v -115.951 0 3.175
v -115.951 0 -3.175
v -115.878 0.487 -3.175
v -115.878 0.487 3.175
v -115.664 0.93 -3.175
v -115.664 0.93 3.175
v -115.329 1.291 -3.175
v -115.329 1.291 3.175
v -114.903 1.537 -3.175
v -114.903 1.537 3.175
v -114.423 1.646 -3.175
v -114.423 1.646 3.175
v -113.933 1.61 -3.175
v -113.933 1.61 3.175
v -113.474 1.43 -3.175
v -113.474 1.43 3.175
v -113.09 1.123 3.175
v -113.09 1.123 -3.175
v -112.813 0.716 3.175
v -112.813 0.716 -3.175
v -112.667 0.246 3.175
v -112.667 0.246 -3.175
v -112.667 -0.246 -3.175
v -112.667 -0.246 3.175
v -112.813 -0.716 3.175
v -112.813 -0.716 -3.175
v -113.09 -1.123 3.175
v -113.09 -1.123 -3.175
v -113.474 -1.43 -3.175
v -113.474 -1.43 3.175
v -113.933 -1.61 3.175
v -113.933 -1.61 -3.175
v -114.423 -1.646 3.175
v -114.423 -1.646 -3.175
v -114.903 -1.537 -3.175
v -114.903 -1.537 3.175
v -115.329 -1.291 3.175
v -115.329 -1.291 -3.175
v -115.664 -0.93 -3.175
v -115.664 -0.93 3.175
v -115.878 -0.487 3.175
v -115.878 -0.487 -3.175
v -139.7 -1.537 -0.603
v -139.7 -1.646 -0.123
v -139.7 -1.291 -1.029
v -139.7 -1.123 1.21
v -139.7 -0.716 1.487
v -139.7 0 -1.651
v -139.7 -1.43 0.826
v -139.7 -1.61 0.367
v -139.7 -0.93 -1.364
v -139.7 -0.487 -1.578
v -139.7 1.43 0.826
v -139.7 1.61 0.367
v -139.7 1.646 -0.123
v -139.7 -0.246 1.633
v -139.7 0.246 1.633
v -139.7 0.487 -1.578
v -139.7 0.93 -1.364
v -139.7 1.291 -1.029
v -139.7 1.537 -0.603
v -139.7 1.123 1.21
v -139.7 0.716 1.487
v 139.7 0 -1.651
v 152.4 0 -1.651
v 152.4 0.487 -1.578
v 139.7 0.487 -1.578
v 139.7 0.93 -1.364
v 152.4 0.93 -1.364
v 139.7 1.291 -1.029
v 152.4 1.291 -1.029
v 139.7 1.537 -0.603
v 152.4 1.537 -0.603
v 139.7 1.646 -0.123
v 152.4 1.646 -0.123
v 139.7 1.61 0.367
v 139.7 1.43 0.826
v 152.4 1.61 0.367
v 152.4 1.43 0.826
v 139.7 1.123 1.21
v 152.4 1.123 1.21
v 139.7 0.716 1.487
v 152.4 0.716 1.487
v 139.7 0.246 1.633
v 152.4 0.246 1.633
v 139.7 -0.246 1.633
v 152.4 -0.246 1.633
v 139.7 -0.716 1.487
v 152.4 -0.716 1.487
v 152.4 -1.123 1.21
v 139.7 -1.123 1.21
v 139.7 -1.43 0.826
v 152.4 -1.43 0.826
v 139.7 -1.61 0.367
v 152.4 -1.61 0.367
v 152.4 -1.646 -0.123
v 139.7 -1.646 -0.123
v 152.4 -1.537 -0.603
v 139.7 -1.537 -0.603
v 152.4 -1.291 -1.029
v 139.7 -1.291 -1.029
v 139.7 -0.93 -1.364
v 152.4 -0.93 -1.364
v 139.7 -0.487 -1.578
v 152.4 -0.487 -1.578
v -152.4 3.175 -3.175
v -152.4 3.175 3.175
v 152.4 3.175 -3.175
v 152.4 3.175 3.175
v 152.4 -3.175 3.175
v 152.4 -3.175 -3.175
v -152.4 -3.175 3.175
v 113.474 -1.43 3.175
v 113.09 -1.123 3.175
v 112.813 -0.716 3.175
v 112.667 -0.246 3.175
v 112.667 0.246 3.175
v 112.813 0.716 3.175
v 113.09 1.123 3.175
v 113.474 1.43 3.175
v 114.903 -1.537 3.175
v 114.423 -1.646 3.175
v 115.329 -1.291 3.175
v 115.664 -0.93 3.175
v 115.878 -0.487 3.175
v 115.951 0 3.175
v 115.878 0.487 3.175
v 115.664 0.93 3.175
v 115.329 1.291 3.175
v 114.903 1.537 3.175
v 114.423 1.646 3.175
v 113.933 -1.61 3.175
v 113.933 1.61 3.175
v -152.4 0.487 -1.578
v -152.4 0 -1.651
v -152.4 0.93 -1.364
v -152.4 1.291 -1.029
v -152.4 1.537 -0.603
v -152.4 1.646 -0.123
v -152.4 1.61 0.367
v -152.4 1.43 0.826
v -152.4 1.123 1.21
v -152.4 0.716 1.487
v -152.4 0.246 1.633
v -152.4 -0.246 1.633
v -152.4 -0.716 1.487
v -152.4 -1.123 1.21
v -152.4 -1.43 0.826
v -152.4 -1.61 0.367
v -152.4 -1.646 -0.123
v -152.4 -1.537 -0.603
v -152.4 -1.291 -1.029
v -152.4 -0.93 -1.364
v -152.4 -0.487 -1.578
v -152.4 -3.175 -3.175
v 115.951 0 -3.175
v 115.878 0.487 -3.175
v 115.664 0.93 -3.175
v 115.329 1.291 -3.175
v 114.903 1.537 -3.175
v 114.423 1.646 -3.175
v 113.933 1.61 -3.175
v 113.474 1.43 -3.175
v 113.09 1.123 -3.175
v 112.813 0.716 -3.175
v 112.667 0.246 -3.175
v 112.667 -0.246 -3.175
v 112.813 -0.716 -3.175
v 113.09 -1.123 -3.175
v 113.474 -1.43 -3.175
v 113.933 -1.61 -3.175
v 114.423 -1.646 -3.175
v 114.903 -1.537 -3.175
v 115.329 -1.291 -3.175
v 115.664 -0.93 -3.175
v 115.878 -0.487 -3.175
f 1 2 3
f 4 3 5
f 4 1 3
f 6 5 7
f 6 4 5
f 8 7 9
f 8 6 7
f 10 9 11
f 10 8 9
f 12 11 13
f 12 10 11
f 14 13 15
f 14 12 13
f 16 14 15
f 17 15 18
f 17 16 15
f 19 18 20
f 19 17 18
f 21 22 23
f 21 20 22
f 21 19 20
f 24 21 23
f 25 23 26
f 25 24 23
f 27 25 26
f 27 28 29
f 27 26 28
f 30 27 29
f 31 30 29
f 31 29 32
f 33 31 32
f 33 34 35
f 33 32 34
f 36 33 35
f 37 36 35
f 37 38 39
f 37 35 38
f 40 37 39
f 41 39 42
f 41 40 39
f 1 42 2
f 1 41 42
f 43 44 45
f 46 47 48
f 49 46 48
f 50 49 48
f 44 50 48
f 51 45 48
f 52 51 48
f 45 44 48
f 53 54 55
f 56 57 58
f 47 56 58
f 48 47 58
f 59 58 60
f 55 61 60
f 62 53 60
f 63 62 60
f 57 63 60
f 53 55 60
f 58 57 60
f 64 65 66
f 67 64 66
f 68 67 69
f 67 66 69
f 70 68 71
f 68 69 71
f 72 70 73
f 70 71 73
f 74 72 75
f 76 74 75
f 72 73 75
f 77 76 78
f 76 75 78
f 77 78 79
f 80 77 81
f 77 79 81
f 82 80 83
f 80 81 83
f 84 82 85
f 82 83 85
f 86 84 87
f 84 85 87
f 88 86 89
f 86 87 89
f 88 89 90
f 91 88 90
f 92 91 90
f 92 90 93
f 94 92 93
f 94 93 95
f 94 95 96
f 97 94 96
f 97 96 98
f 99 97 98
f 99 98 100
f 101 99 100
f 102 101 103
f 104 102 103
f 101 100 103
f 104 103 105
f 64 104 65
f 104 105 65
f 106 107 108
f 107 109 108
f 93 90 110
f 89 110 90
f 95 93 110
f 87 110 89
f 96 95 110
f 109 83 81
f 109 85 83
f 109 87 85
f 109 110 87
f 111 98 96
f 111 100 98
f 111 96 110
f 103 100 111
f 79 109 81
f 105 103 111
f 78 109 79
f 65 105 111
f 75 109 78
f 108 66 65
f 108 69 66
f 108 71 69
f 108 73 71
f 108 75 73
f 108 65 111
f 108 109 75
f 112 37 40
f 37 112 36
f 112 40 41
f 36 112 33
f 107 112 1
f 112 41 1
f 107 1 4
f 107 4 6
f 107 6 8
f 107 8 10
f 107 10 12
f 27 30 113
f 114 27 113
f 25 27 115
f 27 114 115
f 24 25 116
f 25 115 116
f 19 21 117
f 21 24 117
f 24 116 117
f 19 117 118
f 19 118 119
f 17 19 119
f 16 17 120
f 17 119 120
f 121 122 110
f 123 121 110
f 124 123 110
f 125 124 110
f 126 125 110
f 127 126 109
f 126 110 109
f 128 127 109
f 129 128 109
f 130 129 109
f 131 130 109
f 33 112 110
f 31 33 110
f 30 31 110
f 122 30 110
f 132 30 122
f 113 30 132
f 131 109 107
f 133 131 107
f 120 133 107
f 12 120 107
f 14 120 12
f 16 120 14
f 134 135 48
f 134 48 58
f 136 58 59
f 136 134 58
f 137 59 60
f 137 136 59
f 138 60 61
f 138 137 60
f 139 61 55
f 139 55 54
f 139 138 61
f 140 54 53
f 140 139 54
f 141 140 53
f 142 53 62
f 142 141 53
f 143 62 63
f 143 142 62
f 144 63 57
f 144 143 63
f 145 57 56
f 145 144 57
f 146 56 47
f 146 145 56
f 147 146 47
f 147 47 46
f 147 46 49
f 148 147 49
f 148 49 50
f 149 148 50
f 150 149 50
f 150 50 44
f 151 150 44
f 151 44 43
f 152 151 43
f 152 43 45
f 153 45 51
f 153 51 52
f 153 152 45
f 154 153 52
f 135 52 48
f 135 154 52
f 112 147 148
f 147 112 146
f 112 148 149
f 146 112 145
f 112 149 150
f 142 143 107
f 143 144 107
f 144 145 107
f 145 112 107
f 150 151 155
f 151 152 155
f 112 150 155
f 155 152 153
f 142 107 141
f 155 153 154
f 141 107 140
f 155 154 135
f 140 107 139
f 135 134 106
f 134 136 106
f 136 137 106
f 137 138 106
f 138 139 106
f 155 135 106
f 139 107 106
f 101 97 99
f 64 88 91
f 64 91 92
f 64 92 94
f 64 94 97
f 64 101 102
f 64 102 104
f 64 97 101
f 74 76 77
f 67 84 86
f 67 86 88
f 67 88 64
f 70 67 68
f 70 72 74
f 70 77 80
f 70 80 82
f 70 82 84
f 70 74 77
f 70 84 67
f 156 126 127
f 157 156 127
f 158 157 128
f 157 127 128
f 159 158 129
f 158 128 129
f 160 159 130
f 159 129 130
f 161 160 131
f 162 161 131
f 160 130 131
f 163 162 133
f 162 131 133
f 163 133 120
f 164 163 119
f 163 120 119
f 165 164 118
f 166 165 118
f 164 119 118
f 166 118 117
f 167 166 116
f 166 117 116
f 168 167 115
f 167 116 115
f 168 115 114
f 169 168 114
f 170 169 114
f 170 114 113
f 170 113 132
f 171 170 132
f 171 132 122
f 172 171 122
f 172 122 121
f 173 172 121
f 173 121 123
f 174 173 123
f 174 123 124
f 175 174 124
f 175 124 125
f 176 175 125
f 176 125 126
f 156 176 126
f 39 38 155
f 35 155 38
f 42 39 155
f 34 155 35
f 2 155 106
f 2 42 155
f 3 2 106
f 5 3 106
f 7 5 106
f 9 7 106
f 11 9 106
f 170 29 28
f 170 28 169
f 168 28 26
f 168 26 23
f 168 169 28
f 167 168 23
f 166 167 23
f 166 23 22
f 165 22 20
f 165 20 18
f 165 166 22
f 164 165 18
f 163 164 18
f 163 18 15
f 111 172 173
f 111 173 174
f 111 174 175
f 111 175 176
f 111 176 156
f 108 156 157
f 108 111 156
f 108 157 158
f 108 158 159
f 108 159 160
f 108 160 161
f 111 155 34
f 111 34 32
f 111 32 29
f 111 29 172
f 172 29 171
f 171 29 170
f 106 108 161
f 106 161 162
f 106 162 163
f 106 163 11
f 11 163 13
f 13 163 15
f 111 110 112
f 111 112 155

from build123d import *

# Parameters (mm, degrees)
SKETCH1_W           = 6.35
SKETCH1_H           = 6.35
BOSS_EXTRUDE1_DEPTH = 152.4
SKETCH4_R           = 1.651
CUT_EXTRUDE1_DEPTH  = 12.7
SKETCH5_R           = 1.651
CUT_EXTRUDE2_DEPTH  = 153.565274965


with BuildPart() as part:
    # Sketch1 → Boss-Extrude1 (new, symmetric)
    with BuildSketch(Plane(origin=(0, 0, 0), x_dir=(0, 0, -1), z_dir=(1, 0, 0))):
        Rectangle(SKETCH1_W, SKETCH1_H)
    extrude(amount=BOSS_EXTRUDE1_DEPTH, both=True)

    # Sketch4 → Cut-Extrude1 (cut)
    with BuildSketch(Plane(origin=(152.4, 0, 0), x_dir=(0, 0, -1), z_dir=(1, 0, 0))):
        Circle(SKETCH4_R)
    cut_extrude1 = extrude(amount=-CUT_EXTRUDE1_DEPTH, mode=Mode.SUBTRACT)

    # Sketch5 → Cut-Extrude2 (cut, through all)
    with BuildSketch(Plane.XY.offset(3.175)):
        with Locations((114.3, 0)):
            Circle(SKETCH5_R)
    cut_extrude2 = extrude(amount=-CUT_EXTRUDE2_DEPTH, mode=Mode.SUBTRACT)

    # Mirror1: Cut-Extrude1, Cut-Extrude2 across plane
    add(cut_extrude1.mirror(Plane(origin=(0, 0, 0), x_dir=(0, 0, 1), z_dir=(1, 0, 0))), mode=Mode.SUBTRACT)
    add(cut_extrude2.mirror(Plane(origin=(0, 0, 0), x_dir=(0, 0, 1), z_dir=(1, 0, 0))), mode=Mode.SUBTRACT)


solid = part.part
